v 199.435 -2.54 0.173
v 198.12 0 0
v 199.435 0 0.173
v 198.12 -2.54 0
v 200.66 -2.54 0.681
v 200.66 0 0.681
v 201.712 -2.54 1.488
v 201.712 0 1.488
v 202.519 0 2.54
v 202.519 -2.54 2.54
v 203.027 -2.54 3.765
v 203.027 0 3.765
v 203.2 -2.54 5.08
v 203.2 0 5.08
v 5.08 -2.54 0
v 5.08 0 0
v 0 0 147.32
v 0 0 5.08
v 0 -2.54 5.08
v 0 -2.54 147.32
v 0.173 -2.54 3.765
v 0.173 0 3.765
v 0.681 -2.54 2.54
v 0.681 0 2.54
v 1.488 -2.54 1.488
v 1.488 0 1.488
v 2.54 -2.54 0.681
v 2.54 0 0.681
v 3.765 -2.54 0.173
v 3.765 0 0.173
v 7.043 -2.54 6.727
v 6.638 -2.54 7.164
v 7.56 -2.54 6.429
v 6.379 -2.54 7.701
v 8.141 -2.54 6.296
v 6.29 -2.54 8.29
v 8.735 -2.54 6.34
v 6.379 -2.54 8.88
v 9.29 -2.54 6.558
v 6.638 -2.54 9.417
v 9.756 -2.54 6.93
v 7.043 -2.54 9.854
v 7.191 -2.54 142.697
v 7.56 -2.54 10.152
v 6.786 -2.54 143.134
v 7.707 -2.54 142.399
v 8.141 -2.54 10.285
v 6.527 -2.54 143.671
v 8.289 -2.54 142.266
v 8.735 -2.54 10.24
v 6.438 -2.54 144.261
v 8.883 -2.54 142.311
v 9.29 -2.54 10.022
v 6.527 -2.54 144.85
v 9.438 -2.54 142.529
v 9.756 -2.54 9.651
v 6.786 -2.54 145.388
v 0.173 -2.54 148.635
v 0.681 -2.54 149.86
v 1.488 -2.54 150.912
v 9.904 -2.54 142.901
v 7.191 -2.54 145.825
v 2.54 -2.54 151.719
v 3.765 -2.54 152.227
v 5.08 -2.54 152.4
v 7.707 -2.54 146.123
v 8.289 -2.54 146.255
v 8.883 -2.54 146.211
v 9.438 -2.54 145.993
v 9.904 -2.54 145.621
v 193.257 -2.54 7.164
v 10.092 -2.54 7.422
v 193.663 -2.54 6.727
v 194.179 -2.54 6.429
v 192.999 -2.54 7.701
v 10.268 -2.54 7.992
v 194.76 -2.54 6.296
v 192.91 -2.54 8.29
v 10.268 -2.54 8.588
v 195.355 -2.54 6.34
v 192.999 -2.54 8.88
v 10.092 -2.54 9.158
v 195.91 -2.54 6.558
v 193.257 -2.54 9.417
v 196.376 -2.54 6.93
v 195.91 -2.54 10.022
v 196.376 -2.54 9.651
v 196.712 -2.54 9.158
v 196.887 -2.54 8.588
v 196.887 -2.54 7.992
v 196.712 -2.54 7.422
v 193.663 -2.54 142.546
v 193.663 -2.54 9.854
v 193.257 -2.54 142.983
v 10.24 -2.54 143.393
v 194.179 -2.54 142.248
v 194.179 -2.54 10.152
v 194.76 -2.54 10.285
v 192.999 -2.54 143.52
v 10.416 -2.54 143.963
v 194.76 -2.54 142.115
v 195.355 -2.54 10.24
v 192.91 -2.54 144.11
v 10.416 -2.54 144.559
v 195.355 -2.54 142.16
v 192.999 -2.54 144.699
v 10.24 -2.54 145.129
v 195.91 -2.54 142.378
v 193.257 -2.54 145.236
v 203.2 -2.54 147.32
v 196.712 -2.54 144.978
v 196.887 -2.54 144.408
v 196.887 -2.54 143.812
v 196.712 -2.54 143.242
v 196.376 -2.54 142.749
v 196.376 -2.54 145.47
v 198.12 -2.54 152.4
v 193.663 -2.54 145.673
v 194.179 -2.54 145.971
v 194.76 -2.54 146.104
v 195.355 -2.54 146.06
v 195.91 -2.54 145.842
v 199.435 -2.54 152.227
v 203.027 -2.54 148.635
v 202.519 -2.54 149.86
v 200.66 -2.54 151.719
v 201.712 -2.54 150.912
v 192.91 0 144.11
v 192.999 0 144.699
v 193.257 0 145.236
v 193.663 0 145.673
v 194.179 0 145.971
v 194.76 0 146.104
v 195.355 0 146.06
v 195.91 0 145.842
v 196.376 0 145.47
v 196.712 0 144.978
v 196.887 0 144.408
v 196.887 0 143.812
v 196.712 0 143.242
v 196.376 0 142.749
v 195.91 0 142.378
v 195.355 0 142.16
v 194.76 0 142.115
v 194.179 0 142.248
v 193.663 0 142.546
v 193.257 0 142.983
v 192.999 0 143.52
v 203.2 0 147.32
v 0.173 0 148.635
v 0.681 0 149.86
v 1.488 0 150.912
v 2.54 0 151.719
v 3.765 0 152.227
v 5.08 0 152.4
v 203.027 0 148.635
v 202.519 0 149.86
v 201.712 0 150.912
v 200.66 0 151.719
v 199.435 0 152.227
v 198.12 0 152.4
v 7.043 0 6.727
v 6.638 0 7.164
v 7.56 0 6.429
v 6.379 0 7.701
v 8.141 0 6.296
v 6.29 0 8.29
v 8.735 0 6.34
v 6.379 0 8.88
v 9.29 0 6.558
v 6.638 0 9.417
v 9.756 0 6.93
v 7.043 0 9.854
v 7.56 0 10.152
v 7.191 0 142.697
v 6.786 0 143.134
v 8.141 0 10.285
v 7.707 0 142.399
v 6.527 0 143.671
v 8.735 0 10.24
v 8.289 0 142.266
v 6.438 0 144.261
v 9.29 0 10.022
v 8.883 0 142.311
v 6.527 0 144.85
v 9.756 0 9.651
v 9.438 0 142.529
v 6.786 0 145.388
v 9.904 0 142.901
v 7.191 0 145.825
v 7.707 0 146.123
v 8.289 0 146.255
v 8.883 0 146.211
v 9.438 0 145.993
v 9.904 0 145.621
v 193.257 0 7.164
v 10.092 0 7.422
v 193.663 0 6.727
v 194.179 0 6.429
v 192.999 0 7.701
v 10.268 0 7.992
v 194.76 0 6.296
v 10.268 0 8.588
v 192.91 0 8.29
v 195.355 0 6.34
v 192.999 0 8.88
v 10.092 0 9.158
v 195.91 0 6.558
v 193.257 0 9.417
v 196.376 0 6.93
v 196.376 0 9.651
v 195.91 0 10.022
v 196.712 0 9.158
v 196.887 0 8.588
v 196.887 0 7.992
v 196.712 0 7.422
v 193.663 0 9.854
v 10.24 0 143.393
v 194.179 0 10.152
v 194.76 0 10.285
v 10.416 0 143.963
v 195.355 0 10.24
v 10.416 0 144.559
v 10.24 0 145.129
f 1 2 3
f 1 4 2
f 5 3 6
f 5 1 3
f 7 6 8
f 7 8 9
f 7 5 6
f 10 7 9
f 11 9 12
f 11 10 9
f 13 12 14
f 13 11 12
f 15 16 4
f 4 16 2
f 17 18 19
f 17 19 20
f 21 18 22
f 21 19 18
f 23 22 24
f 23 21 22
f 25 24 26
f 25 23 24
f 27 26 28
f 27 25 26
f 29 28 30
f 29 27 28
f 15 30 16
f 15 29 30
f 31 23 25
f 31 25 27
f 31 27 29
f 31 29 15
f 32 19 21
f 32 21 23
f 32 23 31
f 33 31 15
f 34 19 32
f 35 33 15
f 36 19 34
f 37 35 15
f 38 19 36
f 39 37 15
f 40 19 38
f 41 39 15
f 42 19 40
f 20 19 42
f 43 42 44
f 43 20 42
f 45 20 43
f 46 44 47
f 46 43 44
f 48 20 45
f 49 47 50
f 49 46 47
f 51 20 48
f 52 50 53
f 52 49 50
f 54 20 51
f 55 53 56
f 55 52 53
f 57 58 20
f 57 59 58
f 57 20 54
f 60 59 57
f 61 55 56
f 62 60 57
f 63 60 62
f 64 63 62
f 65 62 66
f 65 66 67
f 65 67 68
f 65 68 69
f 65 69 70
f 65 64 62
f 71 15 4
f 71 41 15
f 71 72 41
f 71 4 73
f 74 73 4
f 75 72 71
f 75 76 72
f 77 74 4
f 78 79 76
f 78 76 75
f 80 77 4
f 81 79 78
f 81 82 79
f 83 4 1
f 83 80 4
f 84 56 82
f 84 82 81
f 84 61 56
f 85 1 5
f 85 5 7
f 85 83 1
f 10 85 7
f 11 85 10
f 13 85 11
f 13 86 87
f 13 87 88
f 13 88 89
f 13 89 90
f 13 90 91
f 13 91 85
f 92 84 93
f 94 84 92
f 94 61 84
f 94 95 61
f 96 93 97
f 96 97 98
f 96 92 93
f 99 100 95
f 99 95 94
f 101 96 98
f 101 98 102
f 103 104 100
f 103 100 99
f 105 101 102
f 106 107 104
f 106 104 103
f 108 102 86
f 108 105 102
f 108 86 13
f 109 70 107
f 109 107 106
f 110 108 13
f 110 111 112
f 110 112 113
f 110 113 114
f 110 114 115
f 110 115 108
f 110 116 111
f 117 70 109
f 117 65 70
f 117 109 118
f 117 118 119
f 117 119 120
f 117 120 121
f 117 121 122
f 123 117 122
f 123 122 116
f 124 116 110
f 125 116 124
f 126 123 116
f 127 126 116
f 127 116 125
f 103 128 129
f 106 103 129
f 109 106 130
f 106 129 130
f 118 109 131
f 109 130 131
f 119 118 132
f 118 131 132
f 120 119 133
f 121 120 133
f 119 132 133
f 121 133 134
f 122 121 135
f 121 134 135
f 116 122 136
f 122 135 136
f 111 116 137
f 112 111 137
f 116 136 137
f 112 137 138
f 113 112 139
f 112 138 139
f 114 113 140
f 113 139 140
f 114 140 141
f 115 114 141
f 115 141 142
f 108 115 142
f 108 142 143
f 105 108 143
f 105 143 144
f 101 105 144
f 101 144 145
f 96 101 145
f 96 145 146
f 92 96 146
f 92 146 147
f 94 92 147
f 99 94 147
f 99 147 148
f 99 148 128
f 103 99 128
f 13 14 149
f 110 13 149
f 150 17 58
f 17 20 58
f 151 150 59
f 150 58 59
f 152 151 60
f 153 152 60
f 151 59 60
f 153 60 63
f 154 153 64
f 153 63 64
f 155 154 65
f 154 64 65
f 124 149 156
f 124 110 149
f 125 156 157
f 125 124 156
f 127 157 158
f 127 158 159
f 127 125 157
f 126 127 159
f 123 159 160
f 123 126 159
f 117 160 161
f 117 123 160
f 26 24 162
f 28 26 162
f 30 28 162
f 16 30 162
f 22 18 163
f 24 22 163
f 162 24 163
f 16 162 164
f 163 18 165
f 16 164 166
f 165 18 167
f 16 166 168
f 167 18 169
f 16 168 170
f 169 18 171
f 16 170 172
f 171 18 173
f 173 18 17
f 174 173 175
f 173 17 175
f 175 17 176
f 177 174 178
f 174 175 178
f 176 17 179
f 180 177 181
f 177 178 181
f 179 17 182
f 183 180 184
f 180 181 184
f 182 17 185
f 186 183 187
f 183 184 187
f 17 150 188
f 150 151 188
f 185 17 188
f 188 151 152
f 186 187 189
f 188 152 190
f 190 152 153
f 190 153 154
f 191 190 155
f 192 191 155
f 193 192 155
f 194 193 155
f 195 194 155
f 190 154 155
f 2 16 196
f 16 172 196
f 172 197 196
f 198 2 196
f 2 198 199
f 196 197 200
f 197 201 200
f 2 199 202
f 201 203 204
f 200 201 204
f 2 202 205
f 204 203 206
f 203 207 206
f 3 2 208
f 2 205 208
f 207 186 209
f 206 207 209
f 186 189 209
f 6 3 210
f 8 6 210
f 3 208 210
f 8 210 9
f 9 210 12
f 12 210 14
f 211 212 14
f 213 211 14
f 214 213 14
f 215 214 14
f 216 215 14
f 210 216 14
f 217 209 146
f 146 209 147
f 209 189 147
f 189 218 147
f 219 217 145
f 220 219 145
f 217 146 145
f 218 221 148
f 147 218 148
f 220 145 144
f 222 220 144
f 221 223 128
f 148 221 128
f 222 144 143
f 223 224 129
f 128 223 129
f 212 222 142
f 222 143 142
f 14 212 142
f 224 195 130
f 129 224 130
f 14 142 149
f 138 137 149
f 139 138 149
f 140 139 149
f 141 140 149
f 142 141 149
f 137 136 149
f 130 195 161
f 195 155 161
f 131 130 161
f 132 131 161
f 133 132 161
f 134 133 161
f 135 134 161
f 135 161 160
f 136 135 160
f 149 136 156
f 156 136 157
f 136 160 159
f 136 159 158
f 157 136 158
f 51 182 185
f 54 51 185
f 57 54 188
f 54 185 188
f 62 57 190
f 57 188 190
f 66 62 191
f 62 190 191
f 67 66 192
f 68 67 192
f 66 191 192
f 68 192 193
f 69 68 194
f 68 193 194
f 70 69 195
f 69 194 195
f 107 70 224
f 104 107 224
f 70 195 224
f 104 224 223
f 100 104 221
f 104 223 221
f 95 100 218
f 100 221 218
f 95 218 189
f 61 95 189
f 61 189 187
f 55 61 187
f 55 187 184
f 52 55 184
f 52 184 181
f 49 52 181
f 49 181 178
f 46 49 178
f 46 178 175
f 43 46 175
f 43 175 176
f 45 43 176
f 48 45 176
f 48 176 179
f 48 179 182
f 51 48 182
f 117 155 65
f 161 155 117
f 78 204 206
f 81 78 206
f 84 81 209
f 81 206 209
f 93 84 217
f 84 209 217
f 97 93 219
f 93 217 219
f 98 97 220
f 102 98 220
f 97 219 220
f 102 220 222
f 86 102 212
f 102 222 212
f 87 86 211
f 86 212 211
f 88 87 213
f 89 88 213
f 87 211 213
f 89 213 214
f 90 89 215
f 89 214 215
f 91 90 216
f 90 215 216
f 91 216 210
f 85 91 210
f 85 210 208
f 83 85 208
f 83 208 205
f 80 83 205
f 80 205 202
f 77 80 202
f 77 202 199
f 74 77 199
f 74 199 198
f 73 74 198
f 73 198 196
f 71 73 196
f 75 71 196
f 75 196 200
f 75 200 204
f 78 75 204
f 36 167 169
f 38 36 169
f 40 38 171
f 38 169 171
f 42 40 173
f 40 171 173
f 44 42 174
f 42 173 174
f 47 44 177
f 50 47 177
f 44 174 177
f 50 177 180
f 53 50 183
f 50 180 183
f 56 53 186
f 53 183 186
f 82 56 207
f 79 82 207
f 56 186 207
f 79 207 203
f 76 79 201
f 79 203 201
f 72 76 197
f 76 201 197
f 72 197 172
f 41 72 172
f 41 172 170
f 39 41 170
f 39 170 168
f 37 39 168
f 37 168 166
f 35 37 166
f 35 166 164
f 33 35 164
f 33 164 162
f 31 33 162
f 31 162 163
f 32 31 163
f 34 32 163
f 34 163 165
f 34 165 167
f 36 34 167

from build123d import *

# Parameters (mm, degrees)
F0_W     = 203.2
F0_H     = 152.4
F1_DEPTH = 2.54
F2_R     = 5.08
F4_D     = 4


with BuildPart() as f1:
    # F0 (on Front) → F1 (new body)
    with BuildSketch(Plane.XZ):
        with Locations((101.6, 76.2)):
            Rectangle(F0_W, F0_H)
    extrude(amount=F1_DEPTH)

    # F2
    f2_edges = [f1.edges().sort_by_distance(p)[0] for p in [
        (0, -1.27, 152.4),
        (0, -1.27, 0),
        (203.2, -1.27, 0),
        (203.2, -1.27, 152.4),
    ]]
    fillet(f2_edges, radius=F2_R)

    # F4 (through all)
    with Locations(Plane.XZ.offset(2.54)):
        with Locations((8.438129, 144.260885), (194.909735, 144.109735), (194.909735, 8.290265), (8.290265, 8.290265)):
            Hole(F4_D / 2)


solid = f1.part
